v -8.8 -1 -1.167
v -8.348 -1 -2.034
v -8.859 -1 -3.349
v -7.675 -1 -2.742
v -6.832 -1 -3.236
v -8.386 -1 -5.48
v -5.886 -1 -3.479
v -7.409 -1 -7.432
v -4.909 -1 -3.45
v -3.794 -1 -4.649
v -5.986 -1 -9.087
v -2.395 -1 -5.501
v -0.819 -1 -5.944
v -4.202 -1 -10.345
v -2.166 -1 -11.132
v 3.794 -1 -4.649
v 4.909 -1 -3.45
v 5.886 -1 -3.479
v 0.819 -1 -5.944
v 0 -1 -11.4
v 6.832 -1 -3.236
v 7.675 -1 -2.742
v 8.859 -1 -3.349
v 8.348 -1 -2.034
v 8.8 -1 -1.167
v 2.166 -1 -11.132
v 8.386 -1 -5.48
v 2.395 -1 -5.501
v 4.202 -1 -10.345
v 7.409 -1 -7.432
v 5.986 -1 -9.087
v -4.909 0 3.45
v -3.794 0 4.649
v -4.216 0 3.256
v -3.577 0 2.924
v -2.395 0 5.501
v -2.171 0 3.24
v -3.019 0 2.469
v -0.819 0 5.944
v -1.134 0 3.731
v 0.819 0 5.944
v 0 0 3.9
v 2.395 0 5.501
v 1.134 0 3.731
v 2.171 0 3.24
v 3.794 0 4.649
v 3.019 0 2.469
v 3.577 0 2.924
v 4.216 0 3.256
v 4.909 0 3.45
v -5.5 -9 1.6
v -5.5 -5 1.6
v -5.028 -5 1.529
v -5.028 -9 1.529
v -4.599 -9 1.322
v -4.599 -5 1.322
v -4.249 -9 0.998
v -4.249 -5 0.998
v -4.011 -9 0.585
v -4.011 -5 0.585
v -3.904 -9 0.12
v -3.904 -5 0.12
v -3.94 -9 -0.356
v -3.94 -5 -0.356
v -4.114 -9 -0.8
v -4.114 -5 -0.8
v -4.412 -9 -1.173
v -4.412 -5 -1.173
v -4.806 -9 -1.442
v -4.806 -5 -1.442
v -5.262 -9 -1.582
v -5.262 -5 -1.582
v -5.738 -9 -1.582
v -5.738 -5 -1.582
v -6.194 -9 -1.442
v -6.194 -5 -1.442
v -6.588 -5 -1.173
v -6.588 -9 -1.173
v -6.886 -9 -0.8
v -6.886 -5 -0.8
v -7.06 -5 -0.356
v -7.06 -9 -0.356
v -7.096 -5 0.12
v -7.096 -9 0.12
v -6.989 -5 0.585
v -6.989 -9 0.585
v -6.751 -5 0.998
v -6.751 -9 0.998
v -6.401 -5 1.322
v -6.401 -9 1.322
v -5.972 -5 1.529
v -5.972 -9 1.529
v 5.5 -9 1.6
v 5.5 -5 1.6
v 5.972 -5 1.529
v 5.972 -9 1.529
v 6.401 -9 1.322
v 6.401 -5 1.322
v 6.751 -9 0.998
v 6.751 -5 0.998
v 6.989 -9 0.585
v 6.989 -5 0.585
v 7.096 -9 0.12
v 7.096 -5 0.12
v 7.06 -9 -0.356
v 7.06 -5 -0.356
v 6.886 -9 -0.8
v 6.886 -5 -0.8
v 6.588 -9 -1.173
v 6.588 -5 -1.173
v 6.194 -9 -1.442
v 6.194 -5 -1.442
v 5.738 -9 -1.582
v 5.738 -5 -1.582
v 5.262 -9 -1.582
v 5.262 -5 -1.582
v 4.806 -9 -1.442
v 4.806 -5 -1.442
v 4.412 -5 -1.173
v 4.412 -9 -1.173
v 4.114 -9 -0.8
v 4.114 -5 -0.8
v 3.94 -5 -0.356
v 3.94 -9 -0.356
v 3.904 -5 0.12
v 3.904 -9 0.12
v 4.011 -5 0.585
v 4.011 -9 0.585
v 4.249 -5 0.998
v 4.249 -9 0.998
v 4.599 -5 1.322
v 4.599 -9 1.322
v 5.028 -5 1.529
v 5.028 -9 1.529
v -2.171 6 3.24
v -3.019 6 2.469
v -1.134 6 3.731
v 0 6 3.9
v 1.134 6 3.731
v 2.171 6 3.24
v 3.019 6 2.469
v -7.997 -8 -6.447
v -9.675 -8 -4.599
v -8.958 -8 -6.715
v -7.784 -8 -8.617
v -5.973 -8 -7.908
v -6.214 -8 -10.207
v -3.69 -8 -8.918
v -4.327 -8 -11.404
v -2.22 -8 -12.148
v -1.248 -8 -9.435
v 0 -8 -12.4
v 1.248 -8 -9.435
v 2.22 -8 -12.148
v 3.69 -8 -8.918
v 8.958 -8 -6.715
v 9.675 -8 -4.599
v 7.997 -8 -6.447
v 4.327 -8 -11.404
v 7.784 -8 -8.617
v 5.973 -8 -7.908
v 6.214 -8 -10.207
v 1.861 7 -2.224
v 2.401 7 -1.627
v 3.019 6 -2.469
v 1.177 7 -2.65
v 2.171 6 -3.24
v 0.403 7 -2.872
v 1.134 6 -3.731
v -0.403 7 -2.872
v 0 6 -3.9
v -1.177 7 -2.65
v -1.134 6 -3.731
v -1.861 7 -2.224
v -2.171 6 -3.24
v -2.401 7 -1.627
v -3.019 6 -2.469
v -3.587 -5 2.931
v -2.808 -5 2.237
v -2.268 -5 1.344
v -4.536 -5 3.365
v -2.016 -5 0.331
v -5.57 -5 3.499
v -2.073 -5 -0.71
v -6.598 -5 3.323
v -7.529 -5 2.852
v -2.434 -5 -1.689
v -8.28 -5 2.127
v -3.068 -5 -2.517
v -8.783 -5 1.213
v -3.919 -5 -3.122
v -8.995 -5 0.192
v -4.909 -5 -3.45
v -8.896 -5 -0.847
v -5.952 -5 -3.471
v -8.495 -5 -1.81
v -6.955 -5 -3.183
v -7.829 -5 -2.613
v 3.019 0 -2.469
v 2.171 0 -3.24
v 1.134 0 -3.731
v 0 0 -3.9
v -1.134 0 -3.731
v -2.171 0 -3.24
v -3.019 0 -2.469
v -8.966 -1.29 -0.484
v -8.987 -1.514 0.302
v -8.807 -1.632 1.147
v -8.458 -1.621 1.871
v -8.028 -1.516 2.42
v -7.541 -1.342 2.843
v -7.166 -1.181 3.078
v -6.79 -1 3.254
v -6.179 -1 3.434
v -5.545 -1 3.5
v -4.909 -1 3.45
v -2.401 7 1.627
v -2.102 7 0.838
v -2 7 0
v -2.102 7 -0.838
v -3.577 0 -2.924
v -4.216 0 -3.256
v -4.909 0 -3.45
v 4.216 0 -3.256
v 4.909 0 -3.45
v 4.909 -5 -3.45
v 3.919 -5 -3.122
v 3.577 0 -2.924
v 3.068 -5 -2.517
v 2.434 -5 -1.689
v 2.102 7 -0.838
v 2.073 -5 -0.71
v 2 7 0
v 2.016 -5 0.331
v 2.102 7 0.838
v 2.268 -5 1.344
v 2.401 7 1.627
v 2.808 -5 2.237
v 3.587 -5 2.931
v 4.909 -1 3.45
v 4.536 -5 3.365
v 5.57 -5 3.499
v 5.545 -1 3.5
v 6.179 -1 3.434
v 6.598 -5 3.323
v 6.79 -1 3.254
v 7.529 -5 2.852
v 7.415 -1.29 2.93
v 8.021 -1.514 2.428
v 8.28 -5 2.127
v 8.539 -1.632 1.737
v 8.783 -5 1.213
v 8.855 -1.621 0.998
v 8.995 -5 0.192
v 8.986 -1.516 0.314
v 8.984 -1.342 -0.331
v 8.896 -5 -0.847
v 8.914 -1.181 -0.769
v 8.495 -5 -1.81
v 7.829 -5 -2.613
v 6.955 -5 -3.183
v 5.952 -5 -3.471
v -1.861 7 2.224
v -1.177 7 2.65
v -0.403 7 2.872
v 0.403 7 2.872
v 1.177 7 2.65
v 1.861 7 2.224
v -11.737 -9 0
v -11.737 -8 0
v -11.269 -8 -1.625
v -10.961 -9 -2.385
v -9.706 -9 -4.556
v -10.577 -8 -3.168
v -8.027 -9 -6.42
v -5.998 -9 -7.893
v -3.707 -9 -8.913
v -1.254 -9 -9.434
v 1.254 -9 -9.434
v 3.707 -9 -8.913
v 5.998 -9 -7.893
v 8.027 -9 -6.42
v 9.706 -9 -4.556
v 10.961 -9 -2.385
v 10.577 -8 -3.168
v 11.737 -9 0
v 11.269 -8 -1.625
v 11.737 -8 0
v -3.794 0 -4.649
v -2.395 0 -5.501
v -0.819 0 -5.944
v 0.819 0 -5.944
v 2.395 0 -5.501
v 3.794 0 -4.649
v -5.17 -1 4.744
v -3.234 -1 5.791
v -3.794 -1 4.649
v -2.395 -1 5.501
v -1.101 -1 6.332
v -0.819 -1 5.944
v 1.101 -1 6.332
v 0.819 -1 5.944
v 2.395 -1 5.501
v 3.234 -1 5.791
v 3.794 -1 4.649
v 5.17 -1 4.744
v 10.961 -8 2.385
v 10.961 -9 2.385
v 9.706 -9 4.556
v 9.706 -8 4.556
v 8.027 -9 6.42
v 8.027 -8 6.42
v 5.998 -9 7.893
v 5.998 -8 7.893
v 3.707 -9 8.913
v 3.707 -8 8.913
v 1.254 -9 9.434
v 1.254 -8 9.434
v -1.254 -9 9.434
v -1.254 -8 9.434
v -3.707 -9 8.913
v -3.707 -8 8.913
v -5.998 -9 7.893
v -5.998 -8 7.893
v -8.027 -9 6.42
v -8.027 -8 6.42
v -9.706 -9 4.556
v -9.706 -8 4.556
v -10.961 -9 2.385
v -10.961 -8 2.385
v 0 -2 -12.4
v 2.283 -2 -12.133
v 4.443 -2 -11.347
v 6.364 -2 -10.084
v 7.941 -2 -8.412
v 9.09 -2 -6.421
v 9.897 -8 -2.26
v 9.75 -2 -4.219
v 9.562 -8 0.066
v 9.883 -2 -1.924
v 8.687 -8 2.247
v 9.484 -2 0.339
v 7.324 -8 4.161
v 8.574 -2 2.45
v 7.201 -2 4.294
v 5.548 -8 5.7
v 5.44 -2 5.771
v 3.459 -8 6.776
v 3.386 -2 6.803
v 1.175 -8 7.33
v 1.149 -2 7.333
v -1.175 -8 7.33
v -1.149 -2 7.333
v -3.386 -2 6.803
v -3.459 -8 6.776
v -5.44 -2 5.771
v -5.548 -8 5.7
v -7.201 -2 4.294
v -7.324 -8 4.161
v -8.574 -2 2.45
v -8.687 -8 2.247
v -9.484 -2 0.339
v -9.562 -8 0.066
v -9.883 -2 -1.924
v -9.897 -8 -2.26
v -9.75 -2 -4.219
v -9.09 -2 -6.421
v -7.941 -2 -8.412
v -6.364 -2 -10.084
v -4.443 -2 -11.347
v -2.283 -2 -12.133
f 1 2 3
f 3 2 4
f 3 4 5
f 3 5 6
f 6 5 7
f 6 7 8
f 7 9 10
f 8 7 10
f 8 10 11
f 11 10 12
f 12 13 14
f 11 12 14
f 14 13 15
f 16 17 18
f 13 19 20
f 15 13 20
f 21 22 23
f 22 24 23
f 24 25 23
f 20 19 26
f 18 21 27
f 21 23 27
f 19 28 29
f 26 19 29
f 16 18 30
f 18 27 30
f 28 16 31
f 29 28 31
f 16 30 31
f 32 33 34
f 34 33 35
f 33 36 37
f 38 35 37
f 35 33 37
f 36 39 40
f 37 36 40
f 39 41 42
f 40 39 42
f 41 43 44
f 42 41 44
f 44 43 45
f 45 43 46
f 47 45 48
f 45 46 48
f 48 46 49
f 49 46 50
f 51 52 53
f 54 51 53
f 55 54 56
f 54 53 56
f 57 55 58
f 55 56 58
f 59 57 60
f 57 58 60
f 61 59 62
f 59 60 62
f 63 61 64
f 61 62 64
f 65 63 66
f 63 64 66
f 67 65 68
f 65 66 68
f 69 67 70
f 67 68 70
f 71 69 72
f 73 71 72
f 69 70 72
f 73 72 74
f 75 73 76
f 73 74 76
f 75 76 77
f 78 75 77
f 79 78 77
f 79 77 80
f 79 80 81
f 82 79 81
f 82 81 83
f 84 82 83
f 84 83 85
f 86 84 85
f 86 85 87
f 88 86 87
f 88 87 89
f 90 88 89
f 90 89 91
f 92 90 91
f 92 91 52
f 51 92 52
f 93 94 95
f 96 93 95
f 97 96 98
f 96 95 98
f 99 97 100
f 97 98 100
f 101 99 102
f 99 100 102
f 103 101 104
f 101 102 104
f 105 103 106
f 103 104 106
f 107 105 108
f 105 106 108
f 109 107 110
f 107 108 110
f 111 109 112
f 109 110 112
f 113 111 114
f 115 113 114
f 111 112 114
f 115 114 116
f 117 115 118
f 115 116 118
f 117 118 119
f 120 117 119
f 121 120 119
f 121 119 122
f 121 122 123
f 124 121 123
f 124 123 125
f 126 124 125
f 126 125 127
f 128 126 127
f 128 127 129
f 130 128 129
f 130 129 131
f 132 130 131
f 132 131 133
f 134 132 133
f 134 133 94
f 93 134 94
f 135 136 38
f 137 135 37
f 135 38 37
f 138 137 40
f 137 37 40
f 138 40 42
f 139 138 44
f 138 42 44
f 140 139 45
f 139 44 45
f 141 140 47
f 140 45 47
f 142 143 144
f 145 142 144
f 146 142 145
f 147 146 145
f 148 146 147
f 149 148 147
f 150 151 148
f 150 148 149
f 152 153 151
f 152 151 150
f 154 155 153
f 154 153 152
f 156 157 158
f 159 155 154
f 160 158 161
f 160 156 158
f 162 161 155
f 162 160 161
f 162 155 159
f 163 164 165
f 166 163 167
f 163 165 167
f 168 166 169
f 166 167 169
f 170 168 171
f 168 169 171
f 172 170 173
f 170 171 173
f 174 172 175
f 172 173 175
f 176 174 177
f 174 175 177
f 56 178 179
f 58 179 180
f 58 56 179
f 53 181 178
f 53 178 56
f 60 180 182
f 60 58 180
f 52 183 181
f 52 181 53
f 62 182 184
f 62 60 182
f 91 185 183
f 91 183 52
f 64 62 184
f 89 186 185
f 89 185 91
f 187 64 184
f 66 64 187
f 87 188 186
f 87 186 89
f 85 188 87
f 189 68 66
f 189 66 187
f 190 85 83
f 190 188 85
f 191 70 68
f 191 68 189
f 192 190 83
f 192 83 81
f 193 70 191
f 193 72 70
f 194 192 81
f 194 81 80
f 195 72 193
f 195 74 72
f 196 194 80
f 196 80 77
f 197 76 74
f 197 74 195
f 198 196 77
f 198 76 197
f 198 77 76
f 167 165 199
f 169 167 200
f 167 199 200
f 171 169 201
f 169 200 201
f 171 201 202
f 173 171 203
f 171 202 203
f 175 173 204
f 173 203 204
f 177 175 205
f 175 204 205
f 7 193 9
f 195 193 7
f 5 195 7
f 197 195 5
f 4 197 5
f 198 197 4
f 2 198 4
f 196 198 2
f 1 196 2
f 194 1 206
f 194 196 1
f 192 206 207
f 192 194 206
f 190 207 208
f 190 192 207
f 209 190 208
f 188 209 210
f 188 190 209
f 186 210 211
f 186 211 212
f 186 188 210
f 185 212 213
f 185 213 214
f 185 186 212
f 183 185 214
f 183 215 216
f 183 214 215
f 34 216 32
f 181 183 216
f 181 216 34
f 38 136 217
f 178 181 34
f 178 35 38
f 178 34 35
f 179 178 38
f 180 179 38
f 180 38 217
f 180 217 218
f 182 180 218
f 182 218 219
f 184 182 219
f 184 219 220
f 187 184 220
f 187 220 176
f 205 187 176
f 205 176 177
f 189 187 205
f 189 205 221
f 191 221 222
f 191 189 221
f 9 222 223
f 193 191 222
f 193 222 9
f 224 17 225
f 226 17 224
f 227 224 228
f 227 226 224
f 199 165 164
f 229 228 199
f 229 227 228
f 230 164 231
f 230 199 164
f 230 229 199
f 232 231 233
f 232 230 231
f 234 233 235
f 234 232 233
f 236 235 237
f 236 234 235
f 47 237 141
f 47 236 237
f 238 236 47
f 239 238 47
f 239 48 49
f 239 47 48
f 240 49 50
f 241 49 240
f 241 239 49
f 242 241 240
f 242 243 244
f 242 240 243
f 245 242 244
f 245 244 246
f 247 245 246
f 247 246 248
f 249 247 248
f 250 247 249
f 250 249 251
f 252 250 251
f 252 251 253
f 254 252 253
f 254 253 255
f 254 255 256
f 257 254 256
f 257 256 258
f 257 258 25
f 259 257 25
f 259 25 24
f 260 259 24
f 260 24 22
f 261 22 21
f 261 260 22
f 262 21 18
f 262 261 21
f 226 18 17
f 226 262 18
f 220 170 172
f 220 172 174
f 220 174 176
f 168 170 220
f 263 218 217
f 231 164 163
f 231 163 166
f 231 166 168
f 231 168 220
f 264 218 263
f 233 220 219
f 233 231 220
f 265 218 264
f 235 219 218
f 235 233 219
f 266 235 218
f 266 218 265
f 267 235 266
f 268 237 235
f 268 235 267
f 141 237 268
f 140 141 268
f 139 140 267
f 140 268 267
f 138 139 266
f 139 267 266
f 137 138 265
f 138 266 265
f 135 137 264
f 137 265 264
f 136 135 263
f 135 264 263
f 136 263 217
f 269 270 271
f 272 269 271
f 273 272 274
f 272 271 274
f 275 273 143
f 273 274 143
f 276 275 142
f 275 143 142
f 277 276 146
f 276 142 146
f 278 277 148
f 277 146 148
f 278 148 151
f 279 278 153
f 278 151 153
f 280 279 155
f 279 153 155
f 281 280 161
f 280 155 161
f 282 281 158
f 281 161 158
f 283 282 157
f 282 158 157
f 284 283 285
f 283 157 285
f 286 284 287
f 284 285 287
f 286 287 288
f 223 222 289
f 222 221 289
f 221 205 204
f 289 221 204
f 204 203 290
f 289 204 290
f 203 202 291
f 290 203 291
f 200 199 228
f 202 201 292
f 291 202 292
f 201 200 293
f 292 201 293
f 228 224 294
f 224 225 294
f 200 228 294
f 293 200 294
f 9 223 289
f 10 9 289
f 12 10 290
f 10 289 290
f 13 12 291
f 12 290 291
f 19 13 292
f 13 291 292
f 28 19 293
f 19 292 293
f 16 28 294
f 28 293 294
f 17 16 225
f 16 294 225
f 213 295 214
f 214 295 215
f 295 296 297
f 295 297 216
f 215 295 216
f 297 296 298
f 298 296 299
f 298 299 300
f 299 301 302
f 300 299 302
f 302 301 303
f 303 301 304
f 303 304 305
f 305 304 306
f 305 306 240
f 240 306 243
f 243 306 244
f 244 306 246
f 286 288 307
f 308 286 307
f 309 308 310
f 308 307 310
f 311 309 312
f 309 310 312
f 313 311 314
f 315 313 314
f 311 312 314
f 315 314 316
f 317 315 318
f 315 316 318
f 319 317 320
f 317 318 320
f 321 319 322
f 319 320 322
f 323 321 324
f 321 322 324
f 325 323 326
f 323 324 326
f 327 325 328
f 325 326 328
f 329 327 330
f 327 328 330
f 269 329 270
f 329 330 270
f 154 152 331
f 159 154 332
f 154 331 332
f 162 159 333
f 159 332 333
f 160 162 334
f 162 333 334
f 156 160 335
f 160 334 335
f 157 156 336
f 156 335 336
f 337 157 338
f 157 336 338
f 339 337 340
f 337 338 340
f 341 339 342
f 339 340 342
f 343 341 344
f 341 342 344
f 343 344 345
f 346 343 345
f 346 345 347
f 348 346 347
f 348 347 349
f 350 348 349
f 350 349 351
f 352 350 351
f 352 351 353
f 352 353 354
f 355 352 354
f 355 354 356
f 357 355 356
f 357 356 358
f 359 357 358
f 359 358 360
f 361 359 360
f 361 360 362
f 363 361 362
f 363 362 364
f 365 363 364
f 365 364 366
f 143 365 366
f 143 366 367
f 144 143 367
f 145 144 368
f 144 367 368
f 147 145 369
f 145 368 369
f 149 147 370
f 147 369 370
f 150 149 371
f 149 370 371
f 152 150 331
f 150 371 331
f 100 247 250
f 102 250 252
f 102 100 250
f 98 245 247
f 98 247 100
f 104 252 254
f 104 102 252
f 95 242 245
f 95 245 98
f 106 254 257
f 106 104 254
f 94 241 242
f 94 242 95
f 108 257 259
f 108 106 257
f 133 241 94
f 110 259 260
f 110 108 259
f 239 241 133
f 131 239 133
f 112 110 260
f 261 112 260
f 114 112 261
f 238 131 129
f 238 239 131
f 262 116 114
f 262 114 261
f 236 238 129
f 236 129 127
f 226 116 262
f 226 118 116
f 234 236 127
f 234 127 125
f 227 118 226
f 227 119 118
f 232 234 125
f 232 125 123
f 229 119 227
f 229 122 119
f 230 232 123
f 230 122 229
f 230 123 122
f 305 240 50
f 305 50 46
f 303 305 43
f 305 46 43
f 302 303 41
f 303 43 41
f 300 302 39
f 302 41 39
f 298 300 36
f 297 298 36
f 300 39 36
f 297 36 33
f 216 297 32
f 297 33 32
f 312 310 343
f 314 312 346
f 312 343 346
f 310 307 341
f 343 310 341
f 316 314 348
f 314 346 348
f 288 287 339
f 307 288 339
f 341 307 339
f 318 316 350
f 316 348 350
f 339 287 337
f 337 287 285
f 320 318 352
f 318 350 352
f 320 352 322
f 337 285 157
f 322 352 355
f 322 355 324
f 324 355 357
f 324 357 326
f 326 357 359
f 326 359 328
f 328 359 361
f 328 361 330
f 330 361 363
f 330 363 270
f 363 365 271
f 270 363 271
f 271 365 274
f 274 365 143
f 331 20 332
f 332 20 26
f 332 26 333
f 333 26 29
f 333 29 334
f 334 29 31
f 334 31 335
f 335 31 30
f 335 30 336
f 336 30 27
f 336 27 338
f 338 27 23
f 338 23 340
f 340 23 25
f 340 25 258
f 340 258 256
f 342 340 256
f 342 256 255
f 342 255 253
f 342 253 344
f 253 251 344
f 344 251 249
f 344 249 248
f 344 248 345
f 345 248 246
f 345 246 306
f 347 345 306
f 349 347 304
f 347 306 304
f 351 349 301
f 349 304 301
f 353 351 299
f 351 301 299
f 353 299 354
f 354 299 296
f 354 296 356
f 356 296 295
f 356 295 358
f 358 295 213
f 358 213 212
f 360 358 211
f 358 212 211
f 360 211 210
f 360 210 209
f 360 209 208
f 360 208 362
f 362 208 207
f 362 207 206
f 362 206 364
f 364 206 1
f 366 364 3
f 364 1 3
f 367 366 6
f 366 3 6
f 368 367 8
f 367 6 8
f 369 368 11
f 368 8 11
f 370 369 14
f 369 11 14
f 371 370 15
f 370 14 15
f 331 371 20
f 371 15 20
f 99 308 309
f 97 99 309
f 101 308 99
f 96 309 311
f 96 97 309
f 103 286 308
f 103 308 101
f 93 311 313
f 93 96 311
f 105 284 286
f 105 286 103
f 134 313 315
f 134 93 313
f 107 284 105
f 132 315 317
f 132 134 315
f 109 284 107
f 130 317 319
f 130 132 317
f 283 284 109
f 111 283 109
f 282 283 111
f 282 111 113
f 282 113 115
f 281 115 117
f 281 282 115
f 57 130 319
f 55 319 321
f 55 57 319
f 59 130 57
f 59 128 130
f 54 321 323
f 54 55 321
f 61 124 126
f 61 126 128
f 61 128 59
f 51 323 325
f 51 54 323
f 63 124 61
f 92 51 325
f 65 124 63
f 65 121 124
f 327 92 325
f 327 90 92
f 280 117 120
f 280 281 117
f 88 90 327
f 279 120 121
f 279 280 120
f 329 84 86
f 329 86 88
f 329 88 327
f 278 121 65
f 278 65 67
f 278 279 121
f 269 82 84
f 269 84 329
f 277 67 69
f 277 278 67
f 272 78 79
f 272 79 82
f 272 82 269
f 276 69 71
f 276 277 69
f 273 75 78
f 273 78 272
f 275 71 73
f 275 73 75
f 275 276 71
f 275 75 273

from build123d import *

# Parameters (mm, degrees)
SKETCH1_R               = 3.9
BOSS_EXTRUDE1_DEPTH     = 7
SKETCH2_R               = 6
BOSS_EXTRUDE2_DEPTH     = 1
SKETCH3_R               = 9.9
BOSS_EXTRUDE3_DEPTH     = 7
BOSS_EXTRUDE4_DEPTH     = 1
SKETCH5_R               = 1.6
CUT_EXTRUDE1_DEPTH      = 20.300518128
CUT_EXTRUDE2_DEPTH      = 20.300518128
CUT_EXTRUDE2_DEPTH_BACK = 5
SKETCH7_R               = 3.5
CHAMFER1_SIZE           = 1


with BuildPart() as part:
    # Sketch1 → Boss-Extrude1 (new body)
    with BuildSketch(Plane(origin=(0, 0, 0), x_dir=(1, 0, 0), z_dir=(0, 1, 0))):
        with Locations(Location((0, 0, 0), (0, 0, 270))):
            Circle(SKETCH1_R)
    extrude(amount=BOSS_EXTRUDE1_DEPTH)

    # Sketch2 → Boss-Extrude2 (add)
    with BuildSketch(Plane(origin=(0, 0, 0), x_dir=(-1, 0, 0), z_dir=(0, -1, 0))):
        with Locations(Location((0, 0, 0), (0, 0, 90))):
            Circle(SKETCH2_R)
    extrude(amount=BOSS_EXTRUDE2_DEPTH)

    # Sketch3 → Boss-Extrude3 (add)
    with BuildSketch(Plane(origin=(0, -1, 0), x_dir=(-1, 0, 0), z_dir=(0, -1, 0))):
        with Locations(Location((0, 2.5, 0), (0, 0, 90))):
            Circle(SKETCH3_R)
    extrude(amount=BOSS_EXTRUDE3_DEPTH)

    # Sketch4 → Boss-Extrude4 (add)
    with BuildSketch(Plane(origin=(0, -8, 0), x_dir=(-1, 0, 0), z_dir=(0, -1, 0))):
        with BuildLine():
            ThreePointArc((-11.736694594, 0), (0, -9.5), (11.736694594, 0))
            ThreePointArc((11.736694594, 0), (0, 9.5), (-11.736694594, 0))
        make_face()
    extrude(amount=BOSS_EXTRUDE4_DEPTH)

    # Sketch5 → Cut-Extrude1 (cut, through all)
    with BuildSketch(Plane(origin=(0, 0, 0), x_dir=(1, 0, 0), z_dir=(0, 1, 0))):
        with Locations(Location((5.5, 0, 0), (0, 0, 270))):
            Circle(SKETCH5_R)
        with Locations(Location((-5.5, 0, 0), (0, 0, 270))):
            Circle(SKETCH5_R)
    extrude(amount=-CUT_EXTRUDE1_DEPTH, mode=Mode.SUBTRACT)

    # Sketch7 → Cut-Extrude2 (cut, two sides: drawn at the far end of the back side and taken through both)
    with BuildSketch(Plane(origin=(0, 0, 0), x_dir=(1, 0, 0), z_dir=(0, 1, 0)).offset(-CUT_EXTRUDE2_DEPTH_BACK)):
        with Locations(Location((-5.5, 0, 0), (0, 0, 80.280132298))):
            Circle(SKETCH7_R)
        with Locations(Location((5.5, 0, 0), (0, 0, 99.719867702))):
            Circle(SKETCH7_R)
    extrude(amount=CUT_EXTRUDE2_DEPTH + CUT_EXTRUDE2_DEPTH_BACK, mode=Mode.SUBTRACT)

    # Chamfer1
    # the kernel refuses this chamfer: 1 mm, written as the material it takes off along each edge
    with BuildSketch(Plane(origin=(0, -1, -2.5), x_dir=(0, 0, -1), z_dir=(-1, 0, 0))) as chamfer1_piece_1:
        Polygon((9.9, CHAMFER1_SIZE), (9.9 - CHAMFER1_SIZE, 0), (9.9, 0), align=None)
    revolve(axis=Axis((0, -1, -2.5), (0, -1, 0)), mode=Mode.SUBTRACT)
    with BuildSketch(Plane(origin=(0, 7, 0), x_dir=(0.9996692397523004, 0, -0.025717913855091756), z_dir=(0.025717913855091756, 0, 0.9996692397523004))) as chamfer1_piece_2:
        Polygon((3.9 - CHAMFER1_SIZE, 0), (3.9, -CHAMFER1_SIZE), (3.9, 0), align=None)
    revolve(axis=Axis((0, 7, 0), (0, 1, 0)), revolution_arc=177.05261919, mode=Mode.SUBTRACT)
    with BuildSketch(Plane(origin=(0, 7, 0), x_dir=(0.9996692397523004, 0, 0.02571791385509249), z_dir=(0.02571791385509249, 0, -0.9996692397523004))) as chamfer1_piece_3:
        Polygon((3.9, CHAMFER1_SIZE), (3.9 - CHAMFER1_SIZE, 0), (3.9, 0), align=None)
    revolve(axis=Axis((0, 7, 0), (0, -1, 0)), revolution_arc=177.05261919, mode=Mode.SUBTRACT)


solid = part.part
